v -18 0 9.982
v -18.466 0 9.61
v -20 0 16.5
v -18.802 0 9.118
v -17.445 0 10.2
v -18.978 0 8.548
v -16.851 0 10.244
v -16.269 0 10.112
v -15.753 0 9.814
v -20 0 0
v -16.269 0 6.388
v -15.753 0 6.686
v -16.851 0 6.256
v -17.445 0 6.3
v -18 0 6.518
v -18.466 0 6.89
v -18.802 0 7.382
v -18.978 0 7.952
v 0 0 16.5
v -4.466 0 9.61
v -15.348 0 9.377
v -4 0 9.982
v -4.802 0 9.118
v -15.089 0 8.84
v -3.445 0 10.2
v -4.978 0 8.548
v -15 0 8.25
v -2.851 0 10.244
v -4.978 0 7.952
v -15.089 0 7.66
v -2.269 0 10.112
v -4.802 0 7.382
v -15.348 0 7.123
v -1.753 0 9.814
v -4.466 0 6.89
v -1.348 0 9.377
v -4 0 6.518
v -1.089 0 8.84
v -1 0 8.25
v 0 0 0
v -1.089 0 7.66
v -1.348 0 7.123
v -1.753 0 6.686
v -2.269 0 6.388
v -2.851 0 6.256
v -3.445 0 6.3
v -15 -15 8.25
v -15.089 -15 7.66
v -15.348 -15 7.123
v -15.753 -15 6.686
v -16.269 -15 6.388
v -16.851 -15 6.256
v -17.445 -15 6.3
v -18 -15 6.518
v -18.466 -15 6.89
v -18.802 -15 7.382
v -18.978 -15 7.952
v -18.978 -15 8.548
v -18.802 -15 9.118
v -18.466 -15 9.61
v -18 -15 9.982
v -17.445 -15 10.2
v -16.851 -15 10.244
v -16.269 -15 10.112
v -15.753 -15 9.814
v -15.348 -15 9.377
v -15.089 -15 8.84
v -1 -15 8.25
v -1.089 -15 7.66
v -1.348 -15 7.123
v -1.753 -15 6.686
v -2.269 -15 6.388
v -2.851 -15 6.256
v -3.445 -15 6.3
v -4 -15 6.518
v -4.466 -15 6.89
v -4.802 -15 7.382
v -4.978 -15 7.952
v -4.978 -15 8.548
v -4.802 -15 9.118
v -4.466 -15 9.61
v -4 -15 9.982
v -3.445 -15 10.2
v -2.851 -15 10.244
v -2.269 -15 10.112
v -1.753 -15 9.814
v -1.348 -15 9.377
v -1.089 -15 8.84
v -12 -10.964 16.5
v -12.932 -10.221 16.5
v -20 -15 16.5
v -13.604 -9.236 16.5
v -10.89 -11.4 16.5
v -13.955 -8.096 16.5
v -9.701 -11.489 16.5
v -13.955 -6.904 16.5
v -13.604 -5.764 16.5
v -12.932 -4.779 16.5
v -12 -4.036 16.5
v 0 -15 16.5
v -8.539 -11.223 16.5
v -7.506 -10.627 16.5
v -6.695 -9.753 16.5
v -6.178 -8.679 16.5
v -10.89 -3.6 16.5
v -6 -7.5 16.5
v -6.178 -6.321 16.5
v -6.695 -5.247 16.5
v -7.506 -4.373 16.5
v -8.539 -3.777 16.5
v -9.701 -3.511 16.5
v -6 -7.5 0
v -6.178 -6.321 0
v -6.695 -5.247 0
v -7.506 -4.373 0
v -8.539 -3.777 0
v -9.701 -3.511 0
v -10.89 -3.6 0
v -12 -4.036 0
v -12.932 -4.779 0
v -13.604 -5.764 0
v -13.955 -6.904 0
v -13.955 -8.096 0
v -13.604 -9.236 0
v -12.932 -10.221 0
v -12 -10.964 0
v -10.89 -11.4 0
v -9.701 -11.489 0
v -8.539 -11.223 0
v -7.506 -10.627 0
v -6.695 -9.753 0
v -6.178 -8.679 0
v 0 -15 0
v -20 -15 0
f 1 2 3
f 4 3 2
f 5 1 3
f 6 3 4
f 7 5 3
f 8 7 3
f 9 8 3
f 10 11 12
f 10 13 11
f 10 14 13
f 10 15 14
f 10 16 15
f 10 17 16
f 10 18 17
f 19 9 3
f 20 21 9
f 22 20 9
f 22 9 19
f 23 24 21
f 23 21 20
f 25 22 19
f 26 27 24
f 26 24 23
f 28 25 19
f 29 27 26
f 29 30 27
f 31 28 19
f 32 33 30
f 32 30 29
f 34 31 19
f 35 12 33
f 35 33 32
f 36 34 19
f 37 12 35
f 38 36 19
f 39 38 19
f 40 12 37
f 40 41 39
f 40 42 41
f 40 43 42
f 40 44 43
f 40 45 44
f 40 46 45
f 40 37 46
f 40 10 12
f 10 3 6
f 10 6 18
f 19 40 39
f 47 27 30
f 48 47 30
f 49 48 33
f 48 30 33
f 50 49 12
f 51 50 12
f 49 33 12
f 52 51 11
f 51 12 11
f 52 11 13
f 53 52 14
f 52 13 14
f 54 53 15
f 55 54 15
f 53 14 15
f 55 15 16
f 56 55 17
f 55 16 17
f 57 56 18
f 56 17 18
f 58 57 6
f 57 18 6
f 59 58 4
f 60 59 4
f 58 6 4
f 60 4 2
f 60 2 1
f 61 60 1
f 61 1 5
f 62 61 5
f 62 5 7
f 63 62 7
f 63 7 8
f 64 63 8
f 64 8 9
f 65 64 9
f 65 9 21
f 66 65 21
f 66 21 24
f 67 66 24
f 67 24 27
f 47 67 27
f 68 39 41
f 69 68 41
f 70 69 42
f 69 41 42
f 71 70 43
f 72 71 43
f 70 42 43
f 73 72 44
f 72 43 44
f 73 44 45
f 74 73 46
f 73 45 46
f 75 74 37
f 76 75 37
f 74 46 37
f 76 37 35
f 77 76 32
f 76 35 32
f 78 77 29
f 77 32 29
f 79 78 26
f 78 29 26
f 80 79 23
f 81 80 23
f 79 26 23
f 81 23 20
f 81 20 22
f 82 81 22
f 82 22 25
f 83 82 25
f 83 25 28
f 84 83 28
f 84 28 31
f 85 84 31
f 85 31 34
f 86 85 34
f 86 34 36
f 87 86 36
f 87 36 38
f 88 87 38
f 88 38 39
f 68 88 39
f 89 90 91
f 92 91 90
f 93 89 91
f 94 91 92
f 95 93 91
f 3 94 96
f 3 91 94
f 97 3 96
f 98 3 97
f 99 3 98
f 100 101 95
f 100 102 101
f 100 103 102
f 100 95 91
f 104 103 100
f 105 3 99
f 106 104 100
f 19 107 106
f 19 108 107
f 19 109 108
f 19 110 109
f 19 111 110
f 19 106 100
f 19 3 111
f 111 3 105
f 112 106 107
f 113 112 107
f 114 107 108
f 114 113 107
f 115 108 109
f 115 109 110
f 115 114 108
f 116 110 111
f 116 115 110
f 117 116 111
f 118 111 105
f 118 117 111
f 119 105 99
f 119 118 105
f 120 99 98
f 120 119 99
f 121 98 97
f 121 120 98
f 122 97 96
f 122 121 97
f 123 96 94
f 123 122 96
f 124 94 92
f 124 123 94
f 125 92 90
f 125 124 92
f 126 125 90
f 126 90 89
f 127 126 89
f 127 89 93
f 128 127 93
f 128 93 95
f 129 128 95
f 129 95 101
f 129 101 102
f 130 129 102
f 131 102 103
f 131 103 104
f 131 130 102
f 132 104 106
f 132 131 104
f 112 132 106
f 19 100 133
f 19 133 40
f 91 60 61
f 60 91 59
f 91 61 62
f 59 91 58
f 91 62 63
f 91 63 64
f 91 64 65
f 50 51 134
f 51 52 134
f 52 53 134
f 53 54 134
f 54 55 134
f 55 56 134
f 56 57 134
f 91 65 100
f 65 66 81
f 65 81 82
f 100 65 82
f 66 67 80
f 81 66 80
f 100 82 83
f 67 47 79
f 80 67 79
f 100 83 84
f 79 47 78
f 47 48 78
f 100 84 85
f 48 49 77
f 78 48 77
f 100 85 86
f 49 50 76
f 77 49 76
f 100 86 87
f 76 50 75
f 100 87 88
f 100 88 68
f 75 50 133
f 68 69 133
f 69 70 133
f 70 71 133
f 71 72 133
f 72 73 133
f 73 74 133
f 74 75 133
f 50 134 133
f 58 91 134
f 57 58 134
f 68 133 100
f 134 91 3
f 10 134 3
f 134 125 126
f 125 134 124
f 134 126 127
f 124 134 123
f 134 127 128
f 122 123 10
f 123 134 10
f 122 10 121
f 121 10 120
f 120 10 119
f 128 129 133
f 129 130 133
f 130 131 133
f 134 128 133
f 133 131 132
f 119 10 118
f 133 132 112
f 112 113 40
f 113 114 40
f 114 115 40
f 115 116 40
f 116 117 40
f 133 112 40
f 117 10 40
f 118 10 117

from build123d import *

# Parameters (mm, degrees)
ESQUISSE1_W      = 20
ESQUISSE1_H      = 15
ESQUISSE1_R      = 4
EXTRUSION1_DEPTH = 16.5
ESQUISSE2_R      = 2
EXTRUSION3_DEPTH = 16


with BuildPart() as part:
    # Esquisse1 → Extrusion1 (new body)
    with BuildSketch(Plane.XY):
        with Locations((-10, -7.5)):
            Rectangle(ESQUISSE1_W, ESQUISSE1_H)
        with Locations((-10, -7.5)):
            Circle(ESQUISSE1_R, mode=Mode.SUBTRACT)
    extrude(amount=EXTRUSION1_DEPTH)

    # Esquisse2 → Extrusion3 (cut, through all)
    with BuildSketch(Plane(origin=(0, 0, 0), x_dir=(1, 0, 0), z_dir=(0, 1, 0))):
        with Locations((-17, -8.25)):
            Circle(ESQUISSE2_R)
        with Locations((-3, -8.25)):
            Circle(ESQUISSE2_R)
    extrude(amount=-EXTRUSION3_DEPTH, mode=Mode.SUBTRACT)


solid = part.part
